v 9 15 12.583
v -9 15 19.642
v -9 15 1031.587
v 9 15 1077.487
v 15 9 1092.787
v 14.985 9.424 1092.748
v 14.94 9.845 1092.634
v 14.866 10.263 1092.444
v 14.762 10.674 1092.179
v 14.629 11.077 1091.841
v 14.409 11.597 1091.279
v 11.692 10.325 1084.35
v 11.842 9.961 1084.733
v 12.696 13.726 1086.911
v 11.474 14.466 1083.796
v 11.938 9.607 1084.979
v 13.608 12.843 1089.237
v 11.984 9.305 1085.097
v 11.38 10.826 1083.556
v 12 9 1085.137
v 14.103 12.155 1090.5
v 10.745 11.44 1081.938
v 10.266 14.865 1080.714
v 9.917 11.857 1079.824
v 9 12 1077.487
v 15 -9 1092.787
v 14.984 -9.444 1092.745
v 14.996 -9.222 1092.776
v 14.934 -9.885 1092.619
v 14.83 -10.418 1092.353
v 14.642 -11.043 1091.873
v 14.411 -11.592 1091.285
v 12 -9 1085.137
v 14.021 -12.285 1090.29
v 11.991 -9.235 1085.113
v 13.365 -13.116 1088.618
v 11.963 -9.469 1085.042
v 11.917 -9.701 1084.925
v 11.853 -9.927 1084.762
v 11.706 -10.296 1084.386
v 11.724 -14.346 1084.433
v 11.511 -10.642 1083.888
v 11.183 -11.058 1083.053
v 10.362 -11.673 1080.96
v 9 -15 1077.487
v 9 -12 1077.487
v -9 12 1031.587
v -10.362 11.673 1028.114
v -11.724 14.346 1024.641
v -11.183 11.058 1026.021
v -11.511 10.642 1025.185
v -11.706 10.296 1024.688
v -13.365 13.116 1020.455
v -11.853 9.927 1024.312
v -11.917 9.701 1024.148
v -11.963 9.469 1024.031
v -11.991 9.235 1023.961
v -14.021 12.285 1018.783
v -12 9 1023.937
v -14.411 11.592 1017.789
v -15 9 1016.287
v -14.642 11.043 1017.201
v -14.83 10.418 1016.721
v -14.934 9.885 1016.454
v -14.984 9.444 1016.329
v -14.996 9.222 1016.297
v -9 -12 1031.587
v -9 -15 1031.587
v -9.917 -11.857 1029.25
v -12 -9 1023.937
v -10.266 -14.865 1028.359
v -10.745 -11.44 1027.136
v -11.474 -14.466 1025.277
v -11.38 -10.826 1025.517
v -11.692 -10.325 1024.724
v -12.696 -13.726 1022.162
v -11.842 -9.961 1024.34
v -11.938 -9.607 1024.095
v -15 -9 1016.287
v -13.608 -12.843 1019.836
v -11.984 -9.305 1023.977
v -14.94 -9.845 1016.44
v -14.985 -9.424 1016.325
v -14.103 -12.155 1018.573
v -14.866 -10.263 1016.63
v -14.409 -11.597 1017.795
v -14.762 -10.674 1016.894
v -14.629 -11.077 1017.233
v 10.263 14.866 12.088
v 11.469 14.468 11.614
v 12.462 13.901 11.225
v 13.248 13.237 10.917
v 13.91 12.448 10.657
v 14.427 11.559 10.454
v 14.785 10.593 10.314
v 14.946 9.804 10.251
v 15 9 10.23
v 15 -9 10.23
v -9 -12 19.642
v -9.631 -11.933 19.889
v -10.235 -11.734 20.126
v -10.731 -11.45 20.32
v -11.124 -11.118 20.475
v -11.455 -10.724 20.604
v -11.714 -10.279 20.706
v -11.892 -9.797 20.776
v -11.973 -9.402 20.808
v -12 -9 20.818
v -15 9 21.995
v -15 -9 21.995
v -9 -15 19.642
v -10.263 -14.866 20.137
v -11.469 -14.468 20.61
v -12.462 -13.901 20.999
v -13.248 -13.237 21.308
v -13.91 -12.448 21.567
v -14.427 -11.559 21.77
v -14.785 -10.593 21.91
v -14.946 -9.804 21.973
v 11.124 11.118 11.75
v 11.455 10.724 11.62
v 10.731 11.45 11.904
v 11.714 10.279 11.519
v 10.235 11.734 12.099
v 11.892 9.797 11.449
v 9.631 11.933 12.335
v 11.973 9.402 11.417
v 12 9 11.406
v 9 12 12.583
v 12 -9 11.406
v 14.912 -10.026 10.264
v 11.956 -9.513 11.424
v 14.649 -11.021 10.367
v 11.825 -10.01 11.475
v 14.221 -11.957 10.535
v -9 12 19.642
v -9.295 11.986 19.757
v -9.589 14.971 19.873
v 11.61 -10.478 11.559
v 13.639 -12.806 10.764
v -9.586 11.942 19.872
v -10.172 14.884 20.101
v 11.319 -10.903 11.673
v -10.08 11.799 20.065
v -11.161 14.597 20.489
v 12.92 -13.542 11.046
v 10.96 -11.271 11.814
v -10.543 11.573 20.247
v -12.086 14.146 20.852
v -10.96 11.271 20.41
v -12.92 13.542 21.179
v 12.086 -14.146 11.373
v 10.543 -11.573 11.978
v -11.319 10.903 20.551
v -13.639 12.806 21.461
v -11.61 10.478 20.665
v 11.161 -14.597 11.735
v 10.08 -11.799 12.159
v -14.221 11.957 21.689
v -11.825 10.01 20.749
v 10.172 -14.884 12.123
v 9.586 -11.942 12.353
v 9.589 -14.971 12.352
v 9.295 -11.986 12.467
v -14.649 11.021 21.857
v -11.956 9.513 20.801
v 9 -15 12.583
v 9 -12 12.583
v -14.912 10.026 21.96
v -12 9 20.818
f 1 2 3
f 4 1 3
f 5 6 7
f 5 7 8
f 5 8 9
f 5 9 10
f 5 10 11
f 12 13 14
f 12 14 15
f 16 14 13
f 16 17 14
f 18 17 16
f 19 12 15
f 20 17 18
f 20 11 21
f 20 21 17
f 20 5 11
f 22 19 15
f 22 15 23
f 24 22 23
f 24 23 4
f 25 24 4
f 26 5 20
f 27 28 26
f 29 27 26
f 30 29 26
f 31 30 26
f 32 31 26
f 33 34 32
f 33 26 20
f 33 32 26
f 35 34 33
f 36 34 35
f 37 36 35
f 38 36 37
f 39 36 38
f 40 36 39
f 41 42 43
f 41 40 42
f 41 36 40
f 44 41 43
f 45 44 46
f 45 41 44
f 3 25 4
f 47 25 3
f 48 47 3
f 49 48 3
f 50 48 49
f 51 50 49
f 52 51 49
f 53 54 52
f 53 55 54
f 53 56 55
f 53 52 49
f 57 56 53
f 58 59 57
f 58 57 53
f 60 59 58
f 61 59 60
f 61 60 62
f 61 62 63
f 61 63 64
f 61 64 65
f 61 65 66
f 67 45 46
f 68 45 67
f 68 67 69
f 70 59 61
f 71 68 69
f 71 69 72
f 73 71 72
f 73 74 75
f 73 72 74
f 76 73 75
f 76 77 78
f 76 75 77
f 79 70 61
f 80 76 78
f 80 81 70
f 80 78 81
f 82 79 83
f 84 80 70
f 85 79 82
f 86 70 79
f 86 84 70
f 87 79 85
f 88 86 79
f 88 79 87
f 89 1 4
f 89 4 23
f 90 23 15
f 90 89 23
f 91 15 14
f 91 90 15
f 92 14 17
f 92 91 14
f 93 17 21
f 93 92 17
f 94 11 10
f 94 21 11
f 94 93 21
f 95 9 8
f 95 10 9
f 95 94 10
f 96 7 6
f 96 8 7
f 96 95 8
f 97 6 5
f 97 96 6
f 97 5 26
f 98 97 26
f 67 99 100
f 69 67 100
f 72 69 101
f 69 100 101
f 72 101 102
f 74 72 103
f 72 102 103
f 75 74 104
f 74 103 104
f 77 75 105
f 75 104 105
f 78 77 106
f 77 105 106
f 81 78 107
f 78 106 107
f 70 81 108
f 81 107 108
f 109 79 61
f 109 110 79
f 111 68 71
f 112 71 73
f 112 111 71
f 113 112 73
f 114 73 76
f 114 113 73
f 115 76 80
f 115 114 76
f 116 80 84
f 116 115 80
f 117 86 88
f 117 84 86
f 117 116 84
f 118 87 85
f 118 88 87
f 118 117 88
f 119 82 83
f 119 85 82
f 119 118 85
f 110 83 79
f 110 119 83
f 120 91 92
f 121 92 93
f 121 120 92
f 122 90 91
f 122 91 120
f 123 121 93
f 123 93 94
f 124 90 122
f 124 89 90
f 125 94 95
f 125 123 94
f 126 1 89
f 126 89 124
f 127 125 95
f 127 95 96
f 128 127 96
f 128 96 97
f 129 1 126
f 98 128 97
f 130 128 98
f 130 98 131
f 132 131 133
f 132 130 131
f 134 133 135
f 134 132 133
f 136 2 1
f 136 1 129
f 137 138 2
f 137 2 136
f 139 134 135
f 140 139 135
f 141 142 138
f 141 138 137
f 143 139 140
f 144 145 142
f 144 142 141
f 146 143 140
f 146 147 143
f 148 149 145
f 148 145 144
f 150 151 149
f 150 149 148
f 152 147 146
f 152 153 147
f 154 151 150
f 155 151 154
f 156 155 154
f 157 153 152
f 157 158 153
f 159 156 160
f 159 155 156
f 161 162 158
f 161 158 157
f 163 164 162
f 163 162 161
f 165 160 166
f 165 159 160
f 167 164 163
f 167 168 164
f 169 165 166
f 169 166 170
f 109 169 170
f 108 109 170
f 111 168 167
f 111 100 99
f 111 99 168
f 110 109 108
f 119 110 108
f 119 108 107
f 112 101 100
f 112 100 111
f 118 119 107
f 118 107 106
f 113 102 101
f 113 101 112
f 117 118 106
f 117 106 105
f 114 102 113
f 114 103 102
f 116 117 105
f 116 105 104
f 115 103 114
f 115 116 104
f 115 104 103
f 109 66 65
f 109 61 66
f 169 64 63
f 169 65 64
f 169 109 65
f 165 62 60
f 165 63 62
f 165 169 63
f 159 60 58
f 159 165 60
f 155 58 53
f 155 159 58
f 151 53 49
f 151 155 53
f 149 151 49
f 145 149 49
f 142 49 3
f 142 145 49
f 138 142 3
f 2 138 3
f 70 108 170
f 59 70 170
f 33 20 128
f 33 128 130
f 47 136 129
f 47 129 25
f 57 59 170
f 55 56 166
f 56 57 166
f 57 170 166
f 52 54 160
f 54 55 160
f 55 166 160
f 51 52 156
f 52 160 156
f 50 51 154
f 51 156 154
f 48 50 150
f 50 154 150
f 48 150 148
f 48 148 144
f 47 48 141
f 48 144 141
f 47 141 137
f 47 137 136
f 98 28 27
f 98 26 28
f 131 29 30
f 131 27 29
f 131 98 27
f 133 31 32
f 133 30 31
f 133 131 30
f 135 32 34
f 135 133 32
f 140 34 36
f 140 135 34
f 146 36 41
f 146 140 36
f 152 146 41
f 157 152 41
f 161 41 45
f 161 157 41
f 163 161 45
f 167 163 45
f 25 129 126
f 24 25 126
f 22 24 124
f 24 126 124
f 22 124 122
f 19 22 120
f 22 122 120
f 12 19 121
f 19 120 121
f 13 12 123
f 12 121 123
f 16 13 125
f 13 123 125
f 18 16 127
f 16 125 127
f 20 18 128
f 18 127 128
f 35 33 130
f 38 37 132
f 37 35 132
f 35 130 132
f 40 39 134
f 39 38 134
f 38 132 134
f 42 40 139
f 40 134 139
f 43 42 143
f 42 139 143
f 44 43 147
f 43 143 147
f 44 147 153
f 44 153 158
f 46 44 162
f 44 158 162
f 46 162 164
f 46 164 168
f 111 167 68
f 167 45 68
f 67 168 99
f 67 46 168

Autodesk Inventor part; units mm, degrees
ref_plane "Start Plane" through (0, 0, 10.2298) normal (0, 0, 1) x (1, 0, 0)
ref_plane "End Plane" through (0, 0, 1092.7916) normal (0, 0, 1) x (1, 0, 0)
sketch "Sketch" plane through (0, 0, 0) normal (0, 0, 1) x (1, 0, 0)
  line L0 (-15, -9) -> (-15, 9)
  line L1 (-9, 15) -> (9, 15)
  line L2 (15, 9) -> (15, -9)
  line L3 (9, -15) -> (-9, -15)
  arc A0 (-15, -9) -> (-9, -15) centre (-9, -9) ccw
  arc A1 (-9, 15) -> (-15, 9) centre (-9, 9) ccw
  arc A2 (15, 9) -> (9, 15) centre (9, 9) ccw
  arc A3 (9, -15) -> (15, -9) centre (9, -9) ccw
  arc A4 (-9, 12) -> (-12, 9) centre (-9, 9) ccw
  line L4 (-9, 12) -> (9, 12)
  arc A5 (12, 9) -> (9, 12) centre (9, 9) ccw
  line L5 (12, 9) -> (12, -9)
  arc A6 (9, -12) -> (12, -9) centre (9, -9) ccw
  line L6 (9, -12) -> (-9, -12)
  arc A7 (-12, -9) -> (-9, -12) centre (-9, -9) ccw
  line L7 (-12, -9) -> (-12, 9)
  line L8 (0, 22.7397) -> (0, -22.7397) construction
  line L9 (-22.7397, 0) -> (22.7397, 0) construction
  dimension "d7" = 6
  dimension "d10" = 30
  dimension "d11" = 30
  dimension "d12" = 3
  dimension "d15" = 15
  dimension "d16" = 15
extrude "Body" add sketch "Sketch" along normal up to surface (1082.5618 mm away) from surface at 10.2298
sketch "Sketch3" plane through (0, 0, 0) normal (0, 0, 1) x (1, 0, 0)
  line L0 (0, 0) -> (10, 0)
ref_plane "Work Plane3" through (0, 0, 0) normal (0, -1, 0) x (1, 0, 0)
ref_plane "Work Plane4" through (10.6788, 0, 1081.7726) normal (-0.931, 0, 0.3651) x (0.3651, 0, 0.931)
split "Split1" plane through (10.6788, 0, 1081.7726) removes the side toward (-0.931, 0, 0.3651)
ref_plane "Work Plane5" through (-358.4247, 9, 140.5587) normal (-0.931, 0, 0.3651) x (0.3651, 0, 0.931)
split "Split2" plane through (-358.4247, 9, 140.5587) removes the side toward (-0.931, 0, 0.3651)
ref_plane "Work Plane6" through (13.8551, 0, 10.6788) normal (-0.3651, 0, -0.931) x (-0.931, 0, 0.3651)
split "Split3" plane through (13.8551, 0, 10.6788) removes the side toward (-0.3651, 0, -0.931)
sketch "Sketch4" plane through (0, 0, 0) normal (0, -1, 0) x (1, 0, 0)
  line L0 (-2, 10.2298) -> (12, 10.2298) projected
  line L1 (-2, 1092.7916) -> (12, 1092.7916) projected
  dimension "d18" = 1082.5618
equation "\"d7\" = G_IR"
equation "\"d10\" = G_H"
equation "\"d11\" = G_W"
equation "\"d12\" = G_T"
equation "\"d15\" = 0.5 * d10"
equation "\"d16\" = 0.5 * d11"
equation "\"d3\" = G_L"
equation "\"G_W\" = 30"
equation "\"G_H\" = 30"
equation "\"G_T\" = 3"
equation "\"G_IR\" = 6"
equation "\"G_L\" = d18"
equation "\"G_OFFSET_START\" = -10.22982"
equation "\"G_OFFSET_END\" = -2.83604"
equation "\"d13\" = -G_OFFSET_START"
equation "\"d14\" = G_OFFSET_END + B_L"
equation "\"B_L\" = 1095.62767"
properties part number "DIN EN 10219-2 - 30 x 30 x 3  - 1082.56" material "Steel, Mild"
